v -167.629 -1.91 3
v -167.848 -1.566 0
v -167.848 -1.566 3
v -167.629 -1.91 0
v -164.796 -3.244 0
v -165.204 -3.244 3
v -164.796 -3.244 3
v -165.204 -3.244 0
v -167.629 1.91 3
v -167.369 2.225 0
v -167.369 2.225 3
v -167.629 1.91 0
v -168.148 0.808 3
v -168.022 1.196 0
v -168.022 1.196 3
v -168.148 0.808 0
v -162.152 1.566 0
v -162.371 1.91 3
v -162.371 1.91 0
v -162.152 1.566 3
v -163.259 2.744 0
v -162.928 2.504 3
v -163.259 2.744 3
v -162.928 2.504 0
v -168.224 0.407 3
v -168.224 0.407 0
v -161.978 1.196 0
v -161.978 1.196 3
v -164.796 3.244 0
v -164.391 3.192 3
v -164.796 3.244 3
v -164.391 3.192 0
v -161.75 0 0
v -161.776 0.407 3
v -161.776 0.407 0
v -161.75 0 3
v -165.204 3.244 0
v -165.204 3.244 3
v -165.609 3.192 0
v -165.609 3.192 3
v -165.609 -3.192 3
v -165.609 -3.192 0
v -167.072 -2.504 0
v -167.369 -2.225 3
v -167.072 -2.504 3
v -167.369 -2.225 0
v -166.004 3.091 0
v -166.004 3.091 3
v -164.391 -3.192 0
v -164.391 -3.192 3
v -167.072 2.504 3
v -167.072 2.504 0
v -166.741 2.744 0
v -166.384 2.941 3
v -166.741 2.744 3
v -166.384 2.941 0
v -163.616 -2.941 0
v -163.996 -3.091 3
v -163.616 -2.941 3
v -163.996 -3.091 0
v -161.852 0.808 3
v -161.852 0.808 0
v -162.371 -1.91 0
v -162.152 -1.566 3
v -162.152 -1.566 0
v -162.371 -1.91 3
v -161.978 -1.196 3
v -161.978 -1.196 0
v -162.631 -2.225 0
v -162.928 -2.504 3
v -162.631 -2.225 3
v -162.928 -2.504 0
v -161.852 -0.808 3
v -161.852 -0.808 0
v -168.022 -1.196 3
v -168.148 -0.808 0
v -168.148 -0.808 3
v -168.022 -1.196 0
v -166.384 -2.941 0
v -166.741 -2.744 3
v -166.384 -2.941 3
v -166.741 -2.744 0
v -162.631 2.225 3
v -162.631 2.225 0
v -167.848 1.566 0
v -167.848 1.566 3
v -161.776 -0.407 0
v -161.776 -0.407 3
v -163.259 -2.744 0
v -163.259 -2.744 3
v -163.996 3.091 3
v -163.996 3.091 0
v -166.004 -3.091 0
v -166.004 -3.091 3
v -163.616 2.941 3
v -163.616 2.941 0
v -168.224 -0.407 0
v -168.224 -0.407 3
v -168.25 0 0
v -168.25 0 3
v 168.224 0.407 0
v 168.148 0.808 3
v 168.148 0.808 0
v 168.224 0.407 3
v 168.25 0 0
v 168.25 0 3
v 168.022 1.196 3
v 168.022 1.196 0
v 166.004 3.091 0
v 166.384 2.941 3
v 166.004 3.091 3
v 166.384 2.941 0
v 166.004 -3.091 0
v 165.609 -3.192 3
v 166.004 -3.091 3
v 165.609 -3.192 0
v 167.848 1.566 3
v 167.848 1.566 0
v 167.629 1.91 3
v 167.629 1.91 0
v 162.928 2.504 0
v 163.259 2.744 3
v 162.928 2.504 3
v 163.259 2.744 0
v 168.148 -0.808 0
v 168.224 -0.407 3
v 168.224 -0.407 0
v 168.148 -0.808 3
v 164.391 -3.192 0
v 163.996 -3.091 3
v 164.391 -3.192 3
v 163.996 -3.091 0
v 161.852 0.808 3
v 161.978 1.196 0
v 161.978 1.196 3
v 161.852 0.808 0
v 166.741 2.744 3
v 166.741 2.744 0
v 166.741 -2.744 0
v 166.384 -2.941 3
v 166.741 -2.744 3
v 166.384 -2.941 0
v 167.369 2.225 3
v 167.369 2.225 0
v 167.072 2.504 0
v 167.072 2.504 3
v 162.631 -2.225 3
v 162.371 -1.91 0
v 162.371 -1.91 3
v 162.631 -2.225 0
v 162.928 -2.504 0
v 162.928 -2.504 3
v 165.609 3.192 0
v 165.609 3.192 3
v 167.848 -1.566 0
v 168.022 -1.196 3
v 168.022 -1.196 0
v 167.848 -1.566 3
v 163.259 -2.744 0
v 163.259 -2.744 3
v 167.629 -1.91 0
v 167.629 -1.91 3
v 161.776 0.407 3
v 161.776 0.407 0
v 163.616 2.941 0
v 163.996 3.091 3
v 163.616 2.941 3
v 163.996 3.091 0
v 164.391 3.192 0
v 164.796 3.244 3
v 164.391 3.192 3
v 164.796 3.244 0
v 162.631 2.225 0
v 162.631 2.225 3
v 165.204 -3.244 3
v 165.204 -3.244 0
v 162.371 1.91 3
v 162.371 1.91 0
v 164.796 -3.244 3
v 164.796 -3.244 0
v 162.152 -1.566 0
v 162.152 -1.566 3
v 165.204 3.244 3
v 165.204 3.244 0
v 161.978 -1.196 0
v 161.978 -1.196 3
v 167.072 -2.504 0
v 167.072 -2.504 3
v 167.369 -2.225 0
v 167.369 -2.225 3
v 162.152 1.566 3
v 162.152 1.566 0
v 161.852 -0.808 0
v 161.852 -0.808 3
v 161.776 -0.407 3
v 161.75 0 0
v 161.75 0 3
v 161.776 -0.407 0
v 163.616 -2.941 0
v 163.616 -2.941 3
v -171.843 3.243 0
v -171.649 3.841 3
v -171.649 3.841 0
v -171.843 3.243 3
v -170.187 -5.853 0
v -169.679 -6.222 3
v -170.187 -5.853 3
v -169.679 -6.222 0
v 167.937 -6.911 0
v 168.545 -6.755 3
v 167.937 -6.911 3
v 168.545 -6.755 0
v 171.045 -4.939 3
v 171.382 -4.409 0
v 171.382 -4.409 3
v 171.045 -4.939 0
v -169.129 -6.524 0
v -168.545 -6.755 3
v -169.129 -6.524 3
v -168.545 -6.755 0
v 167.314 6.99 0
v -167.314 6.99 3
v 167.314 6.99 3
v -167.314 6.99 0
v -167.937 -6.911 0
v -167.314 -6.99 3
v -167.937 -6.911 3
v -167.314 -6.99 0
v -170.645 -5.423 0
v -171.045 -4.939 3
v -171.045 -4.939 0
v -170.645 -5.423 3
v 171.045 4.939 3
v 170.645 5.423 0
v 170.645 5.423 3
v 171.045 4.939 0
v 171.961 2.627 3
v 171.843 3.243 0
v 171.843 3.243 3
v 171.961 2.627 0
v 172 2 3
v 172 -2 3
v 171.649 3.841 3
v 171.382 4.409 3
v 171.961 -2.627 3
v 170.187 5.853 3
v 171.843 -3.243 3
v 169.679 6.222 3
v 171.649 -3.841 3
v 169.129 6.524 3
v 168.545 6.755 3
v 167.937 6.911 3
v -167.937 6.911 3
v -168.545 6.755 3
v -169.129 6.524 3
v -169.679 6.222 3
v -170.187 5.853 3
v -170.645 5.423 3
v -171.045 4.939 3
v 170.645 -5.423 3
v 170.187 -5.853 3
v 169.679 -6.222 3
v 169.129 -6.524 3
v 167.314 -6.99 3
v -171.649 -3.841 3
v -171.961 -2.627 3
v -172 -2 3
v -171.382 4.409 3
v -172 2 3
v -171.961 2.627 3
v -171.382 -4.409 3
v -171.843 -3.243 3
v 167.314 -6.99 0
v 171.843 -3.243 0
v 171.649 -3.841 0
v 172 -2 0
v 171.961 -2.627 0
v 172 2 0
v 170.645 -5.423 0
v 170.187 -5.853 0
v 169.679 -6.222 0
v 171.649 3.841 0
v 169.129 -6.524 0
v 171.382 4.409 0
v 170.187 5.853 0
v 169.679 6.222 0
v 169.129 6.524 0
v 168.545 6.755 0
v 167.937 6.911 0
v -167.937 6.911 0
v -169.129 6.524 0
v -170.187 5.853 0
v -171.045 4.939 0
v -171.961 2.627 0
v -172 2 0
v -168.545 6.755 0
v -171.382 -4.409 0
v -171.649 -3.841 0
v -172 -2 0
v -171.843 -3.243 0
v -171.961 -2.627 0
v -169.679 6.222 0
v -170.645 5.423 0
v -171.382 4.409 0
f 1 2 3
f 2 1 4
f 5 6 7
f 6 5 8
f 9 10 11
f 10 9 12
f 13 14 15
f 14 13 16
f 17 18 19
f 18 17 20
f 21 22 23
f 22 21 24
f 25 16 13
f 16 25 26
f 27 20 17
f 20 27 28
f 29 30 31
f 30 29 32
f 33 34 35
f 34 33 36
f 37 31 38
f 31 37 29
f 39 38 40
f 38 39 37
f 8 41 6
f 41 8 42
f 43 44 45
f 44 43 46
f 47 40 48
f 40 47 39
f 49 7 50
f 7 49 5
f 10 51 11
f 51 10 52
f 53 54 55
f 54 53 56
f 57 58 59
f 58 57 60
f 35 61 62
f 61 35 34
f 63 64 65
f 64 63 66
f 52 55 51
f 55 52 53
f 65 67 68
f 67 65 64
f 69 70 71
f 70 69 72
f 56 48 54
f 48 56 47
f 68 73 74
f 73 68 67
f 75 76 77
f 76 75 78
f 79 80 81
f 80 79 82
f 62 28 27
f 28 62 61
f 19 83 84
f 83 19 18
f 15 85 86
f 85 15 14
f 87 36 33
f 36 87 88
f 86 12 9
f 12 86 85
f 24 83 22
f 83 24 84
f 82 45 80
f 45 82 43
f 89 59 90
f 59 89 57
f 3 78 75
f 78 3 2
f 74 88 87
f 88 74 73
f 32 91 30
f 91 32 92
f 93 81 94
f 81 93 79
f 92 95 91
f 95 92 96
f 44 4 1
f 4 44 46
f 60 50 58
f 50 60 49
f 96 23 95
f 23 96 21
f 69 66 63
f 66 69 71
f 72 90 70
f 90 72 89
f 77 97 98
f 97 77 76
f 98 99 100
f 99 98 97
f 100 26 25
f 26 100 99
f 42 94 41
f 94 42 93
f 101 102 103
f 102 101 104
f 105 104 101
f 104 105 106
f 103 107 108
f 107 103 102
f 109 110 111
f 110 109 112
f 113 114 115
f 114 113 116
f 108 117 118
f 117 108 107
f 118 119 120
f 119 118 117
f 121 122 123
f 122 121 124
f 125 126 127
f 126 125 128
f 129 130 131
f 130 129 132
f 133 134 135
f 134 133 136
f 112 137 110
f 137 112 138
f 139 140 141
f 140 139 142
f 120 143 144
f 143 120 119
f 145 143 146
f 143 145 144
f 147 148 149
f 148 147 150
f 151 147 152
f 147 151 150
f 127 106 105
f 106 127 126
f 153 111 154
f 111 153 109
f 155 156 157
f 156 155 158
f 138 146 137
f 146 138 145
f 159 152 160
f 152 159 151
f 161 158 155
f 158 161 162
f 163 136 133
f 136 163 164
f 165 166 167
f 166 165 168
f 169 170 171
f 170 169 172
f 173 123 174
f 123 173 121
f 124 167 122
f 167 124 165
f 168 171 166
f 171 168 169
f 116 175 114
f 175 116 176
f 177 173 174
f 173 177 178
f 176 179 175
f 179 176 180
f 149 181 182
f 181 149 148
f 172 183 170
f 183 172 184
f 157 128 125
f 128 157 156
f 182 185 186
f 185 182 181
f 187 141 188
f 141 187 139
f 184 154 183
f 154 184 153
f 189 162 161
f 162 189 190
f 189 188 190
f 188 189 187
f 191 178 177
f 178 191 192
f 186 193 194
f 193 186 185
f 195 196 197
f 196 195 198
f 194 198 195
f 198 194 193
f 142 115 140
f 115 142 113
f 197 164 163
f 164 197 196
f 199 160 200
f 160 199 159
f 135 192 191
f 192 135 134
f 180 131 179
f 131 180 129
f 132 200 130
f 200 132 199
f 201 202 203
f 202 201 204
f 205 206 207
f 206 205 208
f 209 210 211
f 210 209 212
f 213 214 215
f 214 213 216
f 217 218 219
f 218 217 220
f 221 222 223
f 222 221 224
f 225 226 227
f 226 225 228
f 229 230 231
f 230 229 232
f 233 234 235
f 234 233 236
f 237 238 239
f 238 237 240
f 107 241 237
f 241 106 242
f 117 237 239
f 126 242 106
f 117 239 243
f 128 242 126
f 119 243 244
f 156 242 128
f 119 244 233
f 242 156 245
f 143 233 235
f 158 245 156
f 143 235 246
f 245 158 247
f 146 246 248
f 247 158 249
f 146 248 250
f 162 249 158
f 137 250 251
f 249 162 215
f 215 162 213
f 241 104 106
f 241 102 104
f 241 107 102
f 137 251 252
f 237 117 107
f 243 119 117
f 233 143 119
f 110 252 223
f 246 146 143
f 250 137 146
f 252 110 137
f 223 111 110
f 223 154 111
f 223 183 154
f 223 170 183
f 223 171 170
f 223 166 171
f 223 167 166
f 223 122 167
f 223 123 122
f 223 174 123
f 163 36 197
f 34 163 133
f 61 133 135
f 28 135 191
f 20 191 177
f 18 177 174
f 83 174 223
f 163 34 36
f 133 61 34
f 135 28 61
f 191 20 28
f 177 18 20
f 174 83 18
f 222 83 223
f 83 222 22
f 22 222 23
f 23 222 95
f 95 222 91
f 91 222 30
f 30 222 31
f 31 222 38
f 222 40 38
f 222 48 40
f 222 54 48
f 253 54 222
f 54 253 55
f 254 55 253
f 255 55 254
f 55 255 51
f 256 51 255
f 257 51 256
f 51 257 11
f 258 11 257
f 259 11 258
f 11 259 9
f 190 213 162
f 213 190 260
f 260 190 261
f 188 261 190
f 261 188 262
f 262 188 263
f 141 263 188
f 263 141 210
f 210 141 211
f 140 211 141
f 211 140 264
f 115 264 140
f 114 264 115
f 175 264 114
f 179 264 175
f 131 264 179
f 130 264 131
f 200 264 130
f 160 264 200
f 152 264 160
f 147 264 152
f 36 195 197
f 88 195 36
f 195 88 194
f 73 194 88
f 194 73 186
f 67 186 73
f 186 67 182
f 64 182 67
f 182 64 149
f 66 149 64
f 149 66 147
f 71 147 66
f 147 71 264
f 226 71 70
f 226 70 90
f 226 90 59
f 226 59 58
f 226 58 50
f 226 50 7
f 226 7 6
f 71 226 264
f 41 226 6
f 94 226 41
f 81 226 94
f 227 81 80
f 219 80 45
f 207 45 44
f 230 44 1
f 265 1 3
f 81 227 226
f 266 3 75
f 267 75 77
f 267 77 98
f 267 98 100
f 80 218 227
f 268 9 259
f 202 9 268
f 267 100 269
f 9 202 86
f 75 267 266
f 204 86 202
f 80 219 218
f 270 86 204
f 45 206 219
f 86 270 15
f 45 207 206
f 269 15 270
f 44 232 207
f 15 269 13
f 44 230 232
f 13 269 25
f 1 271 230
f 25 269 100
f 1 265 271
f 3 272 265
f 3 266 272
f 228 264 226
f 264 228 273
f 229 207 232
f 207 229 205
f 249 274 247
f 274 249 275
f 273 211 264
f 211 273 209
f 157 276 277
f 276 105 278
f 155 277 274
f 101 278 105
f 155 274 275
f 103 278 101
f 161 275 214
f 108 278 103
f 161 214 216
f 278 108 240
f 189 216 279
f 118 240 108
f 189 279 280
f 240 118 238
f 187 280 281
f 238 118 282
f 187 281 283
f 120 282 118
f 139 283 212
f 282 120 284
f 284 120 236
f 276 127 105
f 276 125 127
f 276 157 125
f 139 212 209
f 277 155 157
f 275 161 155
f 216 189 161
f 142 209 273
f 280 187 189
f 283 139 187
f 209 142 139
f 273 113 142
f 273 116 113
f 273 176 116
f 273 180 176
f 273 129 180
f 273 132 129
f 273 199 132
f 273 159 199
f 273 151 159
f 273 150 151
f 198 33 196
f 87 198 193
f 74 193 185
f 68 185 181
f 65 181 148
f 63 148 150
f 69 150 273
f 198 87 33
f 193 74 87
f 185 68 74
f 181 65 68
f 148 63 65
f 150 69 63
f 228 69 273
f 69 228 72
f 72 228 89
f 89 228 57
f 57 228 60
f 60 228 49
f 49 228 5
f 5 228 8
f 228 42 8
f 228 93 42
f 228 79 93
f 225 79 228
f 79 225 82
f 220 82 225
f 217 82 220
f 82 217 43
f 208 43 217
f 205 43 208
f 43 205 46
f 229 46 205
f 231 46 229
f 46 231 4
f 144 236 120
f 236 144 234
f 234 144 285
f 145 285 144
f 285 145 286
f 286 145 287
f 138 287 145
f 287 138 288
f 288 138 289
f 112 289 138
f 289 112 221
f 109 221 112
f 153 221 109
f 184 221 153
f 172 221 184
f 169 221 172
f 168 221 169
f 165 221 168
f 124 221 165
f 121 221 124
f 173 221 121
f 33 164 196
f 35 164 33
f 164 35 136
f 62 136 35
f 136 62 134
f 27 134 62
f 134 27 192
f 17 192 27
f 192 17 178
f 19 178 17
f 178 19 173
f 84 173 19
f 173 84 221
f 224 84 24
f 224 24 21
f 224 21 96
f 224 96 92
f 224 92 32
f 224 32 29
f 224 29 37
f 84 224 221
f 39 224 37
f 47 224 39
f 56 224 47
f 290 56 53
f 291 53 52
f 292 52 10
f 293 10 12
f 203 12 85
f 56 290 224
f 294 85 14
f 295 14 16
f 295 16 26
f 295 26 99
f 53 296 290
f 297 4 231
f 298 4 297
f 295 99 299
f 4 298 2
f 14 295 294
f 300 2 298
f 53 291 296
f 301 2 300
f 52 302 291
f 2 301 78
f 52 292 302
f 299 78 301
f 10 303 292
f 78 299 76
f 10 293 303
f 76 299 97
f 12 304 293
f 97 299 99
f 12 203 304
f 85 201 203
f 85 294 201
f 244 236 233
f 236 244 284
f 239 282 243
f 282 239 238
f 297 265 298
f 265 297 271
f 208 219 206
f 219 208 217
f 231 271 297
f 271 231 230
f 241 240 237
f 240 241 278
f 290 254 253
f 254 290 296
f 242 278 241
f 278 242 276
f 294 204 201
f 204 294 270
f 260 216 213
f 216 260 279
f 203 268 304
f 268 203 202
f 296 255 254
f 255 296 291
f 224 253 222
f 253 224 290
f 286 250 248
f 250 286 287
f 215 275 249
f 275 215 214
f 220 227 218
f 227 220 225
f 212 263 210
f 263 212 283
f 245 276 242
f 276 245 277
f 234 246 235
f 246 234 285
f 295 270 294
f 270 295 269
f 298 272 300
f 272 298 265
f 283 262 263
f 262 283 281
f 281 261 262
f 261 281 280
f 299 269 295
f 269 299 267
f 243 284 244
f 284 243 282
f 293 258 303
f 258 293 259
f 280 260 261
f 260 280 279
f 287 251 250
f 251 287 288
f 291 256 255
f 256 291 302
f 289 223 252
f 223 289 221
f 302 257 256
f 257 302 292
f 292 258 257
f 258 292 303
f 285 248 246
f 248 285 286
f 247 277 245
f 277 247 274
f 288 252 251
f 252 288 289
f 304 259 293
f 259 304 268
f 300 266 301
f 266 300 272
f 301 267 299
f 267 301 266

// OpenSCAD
$fn = 50;


difference() {
	union() {
		hull() {
			translate(v = [-167.0000000000, 2.0000000000, 0]) {
				cylinder(h = 3, r = 5);
			}
			translate(v = [167.0000000000, 2.0000000000, 0]) {
				cylinder(h = 3, r = 5);
			}
			translate(v = [-167.0000000000, -2.0000000000, 0]) {
				cylinder(h = 3, r = 5);
			}
			translate(v = [167.0000000000, -2.0000000000, 0]) {
				cylinder(h = 3, r = 5);
			}
		}
	}
	union() {
		translate(v = [-165.0000000000, 0.0000000000, -100.0000000000]) {
			cylinder(h = 200, r = 3.2500000000);
		}
		translate(v = [-165.0000000000, 0.0000000000, -100.0000000000]) {
			cylinder(h = 200, r = 3.2500000000);
		}
		translate(v = [165.0000000000, 0.0000000000, -100.0000000000]) {
			cylinder(h = 200, r = 3.2500000000);
		}
		translate(v = [165.0000000000, 0.0000000000, -100.0000000000]) {
			cylinder(h = 200, r = 3.2500000000);
		}
	}
}
